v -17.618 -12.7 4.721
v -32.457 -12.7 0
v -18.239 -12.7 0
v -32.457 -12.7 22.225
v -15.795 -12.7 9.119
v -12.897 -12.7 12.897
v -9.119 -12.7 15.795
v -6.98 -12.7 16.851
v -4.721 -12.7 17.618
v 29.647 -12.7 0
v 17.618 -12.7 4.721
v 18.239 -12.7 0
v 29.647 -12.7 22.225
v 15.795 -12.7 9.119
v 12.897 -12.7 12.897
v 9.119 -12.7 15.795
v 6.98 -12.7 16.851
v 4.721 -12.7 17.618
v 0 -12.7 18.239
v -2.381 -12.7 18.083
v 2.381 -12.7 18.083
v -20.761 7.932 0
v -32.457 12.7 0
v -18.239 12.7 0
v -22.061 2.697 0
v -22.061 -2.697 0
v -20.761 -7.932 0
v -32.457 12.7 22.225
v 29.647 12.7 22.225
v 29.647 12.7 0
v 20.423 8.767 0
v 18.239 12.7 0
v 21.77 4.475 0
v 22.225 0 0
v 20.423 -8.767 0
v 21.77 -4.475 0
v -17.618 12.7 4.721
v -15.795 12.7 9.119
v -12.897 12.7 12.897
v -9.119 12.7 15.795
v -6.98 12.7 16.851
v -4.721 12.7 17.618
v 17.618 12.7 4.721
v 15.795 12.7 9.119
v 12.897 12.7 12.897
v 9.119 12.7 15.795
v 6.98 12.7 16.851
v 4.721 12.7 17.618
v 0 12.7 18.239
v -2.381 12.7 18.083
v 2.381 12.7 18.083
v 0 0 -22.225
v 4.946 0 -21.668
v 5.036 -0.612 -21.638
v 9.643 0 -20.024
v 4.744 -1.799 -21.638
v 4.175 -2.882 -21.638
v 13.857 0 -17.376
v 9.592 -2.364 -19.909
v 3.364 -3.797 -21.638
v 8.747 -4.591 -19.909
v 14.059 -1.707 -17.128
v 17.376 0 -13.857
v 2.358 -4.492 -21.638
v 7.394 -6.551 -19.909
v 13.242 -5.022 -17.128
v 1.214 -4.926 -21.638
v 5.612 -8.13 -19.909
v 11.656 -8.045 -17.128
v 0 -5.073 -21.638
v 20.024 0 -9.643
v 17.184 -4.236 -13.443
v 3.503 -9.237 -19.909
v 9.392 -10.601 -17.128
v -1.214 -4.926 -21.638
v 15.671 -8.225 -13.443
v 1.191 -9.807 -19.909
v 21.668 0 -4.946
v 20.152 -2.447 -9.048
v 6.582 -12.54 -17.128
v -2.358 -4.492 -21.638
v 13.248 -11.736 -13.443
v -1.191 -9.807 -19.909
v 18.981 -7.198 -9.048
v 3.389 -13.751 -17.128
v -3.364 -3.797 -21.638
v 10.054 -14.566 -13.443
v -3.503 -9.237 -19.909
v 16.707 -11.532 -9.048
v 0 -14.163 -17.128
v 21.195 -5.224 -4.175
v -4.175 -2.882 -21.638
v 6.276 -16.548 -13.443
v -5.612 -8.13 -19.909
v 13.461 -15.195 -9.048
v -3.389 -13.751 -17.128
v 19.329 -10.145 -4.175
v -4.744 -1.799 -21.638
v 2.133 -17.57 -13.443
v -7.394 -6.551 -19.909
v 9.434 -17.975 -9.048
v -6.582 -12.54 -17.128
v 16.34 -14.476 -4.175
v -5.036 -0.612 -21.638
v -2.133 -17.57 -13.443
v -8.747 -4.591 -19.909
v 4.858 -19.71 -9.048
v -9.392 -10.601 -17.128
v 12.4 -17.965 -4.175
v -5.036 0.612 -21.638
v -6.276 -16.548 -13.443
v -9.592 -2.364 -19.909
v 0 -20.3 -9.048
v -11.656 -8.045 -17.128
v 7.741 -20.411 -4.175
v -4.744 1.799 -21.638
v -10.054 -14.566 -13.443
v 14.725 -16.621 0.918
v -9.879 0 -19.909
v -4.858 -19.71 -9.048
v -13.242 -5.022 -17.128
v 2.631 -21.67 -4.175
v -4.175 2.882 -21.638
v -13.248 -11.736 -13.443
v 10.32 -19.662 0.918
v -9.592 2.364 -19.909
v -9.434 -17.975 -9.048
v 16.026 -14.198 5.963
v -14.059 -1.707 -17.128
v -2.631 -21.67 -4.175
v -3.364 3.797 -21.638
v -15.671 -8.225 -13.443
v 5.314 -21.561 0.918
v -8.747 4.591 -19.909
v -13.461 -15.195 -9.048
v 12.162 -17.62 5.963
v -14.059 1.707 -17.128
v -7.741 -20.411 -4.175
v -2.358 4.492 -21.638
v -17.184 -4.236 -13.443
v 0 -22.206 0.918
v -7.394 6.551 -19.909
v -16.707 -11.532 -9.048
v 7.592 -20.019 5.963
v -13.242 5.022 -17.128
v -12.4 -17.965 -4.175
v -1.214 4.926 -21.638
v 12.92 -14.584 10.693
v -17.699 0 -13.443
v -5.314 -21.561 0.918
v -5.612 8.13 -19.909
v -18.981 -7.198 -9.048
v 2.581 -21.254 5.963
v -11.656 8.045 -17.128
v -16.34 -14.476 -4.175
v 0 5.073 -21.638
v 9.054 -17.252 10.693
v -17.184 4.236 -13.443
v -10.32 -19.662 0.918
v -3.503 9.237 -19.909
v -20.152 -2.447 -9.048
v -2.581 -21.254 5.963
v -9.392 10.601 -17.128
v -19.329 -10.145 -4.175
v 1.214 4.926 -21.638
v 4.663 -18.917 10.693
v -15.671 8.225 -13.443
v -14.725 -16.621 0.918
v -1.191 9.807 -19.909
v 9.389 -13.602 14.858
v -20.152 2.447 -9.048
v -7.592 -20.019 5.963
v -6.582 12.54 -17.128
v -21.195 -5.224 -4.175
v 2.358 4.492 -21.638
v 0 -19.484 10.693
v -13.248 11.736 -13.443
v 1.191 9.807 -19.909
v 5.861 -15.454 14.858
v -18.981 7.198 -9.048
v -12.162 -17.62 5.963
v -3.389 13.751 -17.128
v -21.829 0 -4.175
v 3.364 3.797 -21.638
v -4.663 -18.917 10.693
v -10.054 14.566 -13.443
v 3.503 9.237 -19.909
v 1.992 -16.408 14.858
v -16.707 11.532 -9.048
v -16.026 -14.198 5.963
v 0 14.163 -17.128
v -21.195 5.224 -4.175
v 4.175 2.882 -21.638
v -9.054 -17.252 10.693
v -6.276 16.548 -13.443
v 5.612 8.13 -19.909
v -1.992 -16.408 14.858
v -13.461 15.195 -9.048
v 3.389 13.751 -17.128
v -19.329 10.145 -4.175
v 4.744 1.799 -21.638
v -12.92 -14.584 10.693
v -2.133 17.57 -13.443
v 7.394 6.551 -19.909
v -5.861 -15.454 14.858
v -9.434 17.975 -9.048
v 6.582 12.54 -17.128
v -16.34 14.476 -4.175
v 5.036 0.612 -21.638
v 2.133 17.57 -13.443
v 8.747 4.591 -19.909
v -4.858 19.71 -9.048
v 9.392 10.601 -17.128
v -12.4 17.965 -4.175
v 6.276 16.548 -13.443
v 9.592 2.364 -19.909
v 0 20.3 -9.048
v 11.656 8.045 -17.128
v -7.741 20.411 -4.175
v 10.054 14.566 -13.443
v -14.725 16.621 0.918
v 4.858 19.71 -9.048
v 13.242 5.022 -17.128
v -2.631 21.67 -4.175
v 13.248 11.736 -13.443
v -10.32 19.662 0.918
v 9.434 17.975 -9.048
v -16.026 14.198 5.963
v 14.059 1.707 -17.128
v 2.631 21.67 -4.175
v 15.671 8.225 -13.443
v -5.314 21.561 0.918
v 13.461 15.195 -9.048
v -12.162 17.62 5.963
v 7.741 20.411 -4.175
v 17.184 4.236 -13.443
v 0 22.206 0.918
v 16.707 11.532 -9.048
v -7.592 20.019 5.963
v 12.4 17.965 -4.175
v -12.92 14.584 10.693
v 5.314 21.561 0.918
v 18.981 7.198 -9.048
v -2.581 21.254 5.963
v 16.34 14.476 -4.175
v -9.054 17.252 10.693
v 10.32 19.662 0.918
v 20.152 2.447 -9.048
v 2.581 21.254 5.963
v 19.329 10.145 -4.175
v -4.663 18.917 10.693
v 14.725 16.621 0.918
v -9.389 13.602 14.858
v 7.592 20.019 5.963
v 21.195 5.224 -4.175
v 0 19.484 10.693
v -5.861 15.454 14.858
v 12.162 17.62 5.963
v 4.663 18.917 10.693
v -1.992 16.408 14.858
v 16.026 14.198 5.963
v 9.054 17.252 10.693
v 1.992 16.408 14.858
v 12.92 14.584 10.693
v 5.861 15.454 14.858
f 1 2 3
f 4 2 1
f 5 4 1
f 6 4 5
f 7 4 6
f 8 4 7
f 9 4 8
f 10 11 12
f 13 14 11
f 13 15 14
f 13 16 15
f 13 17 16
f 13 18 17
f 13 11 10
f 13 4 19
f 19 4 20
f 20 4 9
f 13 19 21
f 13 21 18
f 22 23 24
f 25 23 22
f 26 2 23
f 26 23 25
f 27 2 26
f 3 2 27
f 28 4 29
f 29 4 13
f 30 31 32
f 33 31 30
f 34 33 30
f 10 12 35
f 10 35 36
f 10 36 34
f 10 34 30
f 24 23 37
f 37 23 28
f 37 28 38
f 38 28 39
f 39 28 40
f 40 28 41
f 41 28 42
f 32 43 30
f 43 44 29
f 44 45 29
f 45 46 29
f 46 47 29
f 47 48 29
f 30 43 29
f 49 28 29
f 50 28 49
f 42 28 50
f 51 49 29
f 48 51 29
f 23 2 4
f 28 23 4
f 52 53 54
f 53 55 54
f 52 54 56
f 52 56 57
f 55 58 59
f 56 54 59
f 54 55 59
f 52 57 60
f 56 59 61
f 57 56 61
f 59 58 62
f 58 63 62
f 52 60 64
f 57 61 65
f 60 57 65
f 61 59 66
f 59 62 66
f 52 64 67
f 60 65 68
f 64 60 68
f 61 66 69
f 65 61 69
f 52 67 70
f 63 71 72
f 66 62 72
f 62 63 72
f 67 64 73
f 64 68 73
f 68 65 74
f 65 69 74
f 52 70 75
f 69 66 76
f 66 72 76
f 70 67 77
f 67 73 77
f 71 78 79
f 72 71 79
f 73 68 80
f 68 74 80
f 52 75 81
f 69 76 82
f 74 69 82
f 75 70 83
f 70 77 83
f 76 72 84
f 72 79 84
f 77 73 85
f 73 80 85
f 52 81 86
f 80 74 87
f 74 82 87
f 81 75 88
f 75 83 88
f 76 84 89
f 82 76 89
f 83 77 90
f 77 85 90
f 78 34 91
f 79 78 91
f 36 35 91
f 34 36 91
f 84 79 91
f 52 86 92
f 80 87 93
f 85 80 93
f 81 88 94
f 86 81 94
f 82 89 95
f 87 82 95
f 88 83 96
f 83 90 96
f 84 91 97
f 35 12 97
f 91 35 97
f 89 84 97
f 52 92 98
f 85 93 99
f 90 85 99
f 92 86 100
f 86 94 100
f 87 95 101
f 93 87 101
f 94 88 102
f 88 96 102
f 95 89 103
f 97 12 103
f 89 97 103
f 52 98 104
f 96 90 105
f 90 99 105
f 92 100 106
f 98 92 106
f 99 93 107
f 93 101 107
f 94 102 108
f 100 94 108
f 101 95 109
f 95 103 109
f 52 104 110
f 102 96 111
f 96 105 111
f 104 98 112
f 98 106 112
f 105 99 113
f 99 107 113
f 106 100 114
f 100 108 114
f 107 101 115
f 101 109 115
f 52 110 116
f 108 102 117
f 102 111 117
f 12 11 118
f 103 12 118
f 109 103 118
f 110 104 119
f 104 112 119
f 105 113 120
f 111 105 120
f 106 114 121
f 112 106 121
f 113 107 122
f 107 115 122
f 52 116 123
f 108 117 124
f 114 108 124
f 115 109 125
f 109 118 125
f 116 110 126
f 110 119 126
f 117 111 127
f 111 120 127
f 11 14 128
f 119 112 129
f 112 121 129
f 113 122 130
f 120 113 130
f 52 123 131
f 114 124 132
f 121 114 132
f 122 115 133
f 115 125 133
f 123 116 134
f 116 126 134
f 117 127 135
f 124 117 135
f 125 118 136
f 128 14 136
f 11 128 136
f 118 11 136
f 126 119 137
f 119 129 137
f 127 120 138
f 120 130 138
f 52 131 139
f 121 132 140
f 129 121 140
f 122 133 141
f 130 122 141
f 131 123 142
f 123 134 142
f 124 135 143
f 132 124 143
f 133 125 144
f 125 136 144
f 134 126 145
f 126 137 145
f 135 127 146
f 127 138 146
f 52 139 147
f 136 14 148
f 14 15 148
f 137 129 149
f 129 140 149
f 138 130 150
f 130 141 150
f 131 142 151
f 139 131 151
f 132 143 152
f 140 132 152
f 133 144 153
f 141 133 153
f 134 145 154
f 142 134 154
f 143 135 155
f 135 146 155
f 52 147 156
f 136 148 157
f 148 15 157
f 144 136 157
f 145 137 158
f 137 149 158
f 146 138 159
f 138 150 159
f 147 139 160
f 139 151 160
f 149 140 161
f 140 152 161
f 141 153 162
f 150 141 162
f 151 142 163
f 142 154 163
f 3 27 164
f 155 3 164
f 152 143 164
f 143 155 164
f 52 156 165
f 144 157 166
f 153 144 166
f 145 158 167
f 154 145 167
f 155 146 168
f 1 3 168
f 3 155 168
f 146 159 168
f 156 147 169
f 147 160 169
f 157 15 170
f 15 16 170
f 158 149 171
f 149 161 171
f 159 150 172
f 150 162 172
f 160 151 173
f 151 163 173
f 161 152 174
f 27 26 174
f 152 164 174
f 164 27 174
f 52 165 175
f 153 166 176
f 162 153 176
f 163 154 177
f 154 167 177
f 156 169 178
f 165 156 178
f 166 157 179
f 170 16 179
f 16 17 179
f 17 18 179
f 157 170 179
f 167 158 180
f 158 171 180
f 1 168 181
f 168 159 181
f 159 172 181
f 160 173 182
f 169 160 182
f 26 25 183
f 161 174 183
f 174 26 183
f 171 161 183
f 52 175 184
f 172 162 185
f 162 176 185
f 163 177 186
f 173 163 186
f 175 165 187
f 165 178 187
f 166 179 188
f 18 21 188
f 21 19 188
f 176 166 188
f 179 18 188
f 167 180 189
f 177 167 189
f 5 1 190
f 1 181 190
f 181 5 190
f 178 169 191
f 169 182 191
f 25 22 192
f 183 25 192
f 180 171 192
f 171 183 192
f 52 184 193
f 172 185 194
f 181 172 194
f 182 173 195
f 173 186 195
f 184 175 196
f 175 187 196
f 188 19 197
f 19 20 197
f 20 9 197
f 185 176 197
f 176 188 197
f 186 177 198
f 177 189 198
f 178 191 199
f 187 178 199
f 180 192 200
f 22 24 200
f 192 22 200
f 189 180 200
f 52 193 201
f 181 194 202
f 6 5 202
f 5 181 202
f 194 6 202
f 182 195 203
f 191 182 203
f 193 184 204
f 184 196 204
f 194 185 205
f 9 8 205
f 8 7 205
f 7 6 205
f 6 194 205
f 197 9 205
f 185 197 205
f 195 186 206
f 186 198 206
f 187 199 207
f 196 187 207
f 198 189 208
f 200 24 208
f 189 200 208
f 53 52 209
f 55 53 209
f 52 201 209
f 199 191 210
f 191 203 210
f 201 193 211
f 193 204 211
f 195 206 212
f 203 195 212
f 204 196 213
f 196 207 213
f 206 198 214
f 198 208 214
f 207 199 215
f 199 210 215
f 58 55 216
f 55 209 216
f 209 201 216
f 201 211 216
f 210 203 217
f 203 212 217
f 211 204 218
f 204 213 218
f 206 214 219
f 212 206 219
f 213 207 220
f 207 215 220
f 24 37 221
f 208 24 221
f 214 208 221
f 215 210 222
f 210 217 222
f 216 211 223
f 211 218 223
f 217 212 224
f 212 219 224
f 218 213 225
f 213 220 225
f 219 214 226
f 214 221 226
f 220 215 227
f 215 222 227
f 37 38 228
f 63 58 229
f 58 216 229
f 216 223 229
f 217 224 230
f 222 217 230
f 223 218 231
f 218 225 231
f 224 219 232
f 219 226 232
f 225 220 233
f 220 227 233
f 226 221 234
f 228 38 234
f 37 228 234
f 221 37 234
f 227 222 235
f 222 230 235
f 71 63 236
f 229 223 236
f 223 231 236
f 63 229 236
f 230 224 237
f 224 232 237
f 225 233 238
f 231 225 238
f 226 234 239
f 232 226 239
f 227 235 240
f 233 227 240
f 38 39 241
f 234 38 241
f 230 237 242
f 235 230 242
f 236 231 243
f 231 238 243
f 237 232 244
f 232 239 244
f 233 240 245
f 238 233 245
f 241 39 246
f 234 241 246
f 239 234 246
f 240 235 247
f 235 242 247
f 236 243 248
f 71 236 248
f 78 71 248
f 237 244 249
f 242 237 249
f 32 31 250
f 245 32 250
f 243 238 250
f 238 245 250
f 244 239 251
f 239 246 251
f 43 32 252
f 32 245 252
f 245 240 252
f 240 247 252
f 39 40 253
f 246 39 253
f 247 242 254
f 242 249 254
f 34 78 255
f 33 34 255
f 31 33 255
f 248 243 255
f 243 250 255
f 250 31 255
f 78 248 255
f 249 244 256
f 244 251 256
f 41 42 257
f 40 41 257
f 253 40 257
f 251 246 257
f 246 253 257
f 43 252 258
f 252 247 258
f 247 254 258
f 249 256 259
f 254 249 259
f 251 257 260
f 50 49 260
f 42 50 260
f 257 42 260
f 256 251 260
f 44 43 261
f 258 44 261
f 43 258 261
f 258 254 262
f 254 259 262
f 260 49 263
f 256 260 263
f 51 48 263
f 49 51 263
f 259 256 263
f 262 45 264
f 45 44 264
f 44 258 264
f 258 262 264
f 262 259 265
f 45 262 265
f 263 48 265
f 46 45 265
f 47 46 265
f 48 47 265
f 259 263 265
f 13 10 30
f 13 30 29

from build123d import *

# Parameters (mm, degrees)
F2_W     = 62.104048
F2_H     = 22.225
F3_DEPTH = 12.7


with BuildPart() as f1:
    # F0 (on Front) → F1 (revolve)
    with BuildSketch(Plane.XZ):
        with BuildLine():
            Line((0, 22.225), (0, -22.225))
            ThreePointArc((0, -22.225), (22.225, 0), (0, 22.225))
        make_face()
    revolve(axis=Axis((0, 0, 0), (0, 0, -1)))

    # F2 (on Front) → F3 (join, symmetric)
    with BuildSketch(Plane.XZ):
        with Locations((-1.405022, 11.1125)):
            Rectangle(F2_W, F2_H)
    extrude(amount=F3_DEPTH, both=True)


solid = f1.part
